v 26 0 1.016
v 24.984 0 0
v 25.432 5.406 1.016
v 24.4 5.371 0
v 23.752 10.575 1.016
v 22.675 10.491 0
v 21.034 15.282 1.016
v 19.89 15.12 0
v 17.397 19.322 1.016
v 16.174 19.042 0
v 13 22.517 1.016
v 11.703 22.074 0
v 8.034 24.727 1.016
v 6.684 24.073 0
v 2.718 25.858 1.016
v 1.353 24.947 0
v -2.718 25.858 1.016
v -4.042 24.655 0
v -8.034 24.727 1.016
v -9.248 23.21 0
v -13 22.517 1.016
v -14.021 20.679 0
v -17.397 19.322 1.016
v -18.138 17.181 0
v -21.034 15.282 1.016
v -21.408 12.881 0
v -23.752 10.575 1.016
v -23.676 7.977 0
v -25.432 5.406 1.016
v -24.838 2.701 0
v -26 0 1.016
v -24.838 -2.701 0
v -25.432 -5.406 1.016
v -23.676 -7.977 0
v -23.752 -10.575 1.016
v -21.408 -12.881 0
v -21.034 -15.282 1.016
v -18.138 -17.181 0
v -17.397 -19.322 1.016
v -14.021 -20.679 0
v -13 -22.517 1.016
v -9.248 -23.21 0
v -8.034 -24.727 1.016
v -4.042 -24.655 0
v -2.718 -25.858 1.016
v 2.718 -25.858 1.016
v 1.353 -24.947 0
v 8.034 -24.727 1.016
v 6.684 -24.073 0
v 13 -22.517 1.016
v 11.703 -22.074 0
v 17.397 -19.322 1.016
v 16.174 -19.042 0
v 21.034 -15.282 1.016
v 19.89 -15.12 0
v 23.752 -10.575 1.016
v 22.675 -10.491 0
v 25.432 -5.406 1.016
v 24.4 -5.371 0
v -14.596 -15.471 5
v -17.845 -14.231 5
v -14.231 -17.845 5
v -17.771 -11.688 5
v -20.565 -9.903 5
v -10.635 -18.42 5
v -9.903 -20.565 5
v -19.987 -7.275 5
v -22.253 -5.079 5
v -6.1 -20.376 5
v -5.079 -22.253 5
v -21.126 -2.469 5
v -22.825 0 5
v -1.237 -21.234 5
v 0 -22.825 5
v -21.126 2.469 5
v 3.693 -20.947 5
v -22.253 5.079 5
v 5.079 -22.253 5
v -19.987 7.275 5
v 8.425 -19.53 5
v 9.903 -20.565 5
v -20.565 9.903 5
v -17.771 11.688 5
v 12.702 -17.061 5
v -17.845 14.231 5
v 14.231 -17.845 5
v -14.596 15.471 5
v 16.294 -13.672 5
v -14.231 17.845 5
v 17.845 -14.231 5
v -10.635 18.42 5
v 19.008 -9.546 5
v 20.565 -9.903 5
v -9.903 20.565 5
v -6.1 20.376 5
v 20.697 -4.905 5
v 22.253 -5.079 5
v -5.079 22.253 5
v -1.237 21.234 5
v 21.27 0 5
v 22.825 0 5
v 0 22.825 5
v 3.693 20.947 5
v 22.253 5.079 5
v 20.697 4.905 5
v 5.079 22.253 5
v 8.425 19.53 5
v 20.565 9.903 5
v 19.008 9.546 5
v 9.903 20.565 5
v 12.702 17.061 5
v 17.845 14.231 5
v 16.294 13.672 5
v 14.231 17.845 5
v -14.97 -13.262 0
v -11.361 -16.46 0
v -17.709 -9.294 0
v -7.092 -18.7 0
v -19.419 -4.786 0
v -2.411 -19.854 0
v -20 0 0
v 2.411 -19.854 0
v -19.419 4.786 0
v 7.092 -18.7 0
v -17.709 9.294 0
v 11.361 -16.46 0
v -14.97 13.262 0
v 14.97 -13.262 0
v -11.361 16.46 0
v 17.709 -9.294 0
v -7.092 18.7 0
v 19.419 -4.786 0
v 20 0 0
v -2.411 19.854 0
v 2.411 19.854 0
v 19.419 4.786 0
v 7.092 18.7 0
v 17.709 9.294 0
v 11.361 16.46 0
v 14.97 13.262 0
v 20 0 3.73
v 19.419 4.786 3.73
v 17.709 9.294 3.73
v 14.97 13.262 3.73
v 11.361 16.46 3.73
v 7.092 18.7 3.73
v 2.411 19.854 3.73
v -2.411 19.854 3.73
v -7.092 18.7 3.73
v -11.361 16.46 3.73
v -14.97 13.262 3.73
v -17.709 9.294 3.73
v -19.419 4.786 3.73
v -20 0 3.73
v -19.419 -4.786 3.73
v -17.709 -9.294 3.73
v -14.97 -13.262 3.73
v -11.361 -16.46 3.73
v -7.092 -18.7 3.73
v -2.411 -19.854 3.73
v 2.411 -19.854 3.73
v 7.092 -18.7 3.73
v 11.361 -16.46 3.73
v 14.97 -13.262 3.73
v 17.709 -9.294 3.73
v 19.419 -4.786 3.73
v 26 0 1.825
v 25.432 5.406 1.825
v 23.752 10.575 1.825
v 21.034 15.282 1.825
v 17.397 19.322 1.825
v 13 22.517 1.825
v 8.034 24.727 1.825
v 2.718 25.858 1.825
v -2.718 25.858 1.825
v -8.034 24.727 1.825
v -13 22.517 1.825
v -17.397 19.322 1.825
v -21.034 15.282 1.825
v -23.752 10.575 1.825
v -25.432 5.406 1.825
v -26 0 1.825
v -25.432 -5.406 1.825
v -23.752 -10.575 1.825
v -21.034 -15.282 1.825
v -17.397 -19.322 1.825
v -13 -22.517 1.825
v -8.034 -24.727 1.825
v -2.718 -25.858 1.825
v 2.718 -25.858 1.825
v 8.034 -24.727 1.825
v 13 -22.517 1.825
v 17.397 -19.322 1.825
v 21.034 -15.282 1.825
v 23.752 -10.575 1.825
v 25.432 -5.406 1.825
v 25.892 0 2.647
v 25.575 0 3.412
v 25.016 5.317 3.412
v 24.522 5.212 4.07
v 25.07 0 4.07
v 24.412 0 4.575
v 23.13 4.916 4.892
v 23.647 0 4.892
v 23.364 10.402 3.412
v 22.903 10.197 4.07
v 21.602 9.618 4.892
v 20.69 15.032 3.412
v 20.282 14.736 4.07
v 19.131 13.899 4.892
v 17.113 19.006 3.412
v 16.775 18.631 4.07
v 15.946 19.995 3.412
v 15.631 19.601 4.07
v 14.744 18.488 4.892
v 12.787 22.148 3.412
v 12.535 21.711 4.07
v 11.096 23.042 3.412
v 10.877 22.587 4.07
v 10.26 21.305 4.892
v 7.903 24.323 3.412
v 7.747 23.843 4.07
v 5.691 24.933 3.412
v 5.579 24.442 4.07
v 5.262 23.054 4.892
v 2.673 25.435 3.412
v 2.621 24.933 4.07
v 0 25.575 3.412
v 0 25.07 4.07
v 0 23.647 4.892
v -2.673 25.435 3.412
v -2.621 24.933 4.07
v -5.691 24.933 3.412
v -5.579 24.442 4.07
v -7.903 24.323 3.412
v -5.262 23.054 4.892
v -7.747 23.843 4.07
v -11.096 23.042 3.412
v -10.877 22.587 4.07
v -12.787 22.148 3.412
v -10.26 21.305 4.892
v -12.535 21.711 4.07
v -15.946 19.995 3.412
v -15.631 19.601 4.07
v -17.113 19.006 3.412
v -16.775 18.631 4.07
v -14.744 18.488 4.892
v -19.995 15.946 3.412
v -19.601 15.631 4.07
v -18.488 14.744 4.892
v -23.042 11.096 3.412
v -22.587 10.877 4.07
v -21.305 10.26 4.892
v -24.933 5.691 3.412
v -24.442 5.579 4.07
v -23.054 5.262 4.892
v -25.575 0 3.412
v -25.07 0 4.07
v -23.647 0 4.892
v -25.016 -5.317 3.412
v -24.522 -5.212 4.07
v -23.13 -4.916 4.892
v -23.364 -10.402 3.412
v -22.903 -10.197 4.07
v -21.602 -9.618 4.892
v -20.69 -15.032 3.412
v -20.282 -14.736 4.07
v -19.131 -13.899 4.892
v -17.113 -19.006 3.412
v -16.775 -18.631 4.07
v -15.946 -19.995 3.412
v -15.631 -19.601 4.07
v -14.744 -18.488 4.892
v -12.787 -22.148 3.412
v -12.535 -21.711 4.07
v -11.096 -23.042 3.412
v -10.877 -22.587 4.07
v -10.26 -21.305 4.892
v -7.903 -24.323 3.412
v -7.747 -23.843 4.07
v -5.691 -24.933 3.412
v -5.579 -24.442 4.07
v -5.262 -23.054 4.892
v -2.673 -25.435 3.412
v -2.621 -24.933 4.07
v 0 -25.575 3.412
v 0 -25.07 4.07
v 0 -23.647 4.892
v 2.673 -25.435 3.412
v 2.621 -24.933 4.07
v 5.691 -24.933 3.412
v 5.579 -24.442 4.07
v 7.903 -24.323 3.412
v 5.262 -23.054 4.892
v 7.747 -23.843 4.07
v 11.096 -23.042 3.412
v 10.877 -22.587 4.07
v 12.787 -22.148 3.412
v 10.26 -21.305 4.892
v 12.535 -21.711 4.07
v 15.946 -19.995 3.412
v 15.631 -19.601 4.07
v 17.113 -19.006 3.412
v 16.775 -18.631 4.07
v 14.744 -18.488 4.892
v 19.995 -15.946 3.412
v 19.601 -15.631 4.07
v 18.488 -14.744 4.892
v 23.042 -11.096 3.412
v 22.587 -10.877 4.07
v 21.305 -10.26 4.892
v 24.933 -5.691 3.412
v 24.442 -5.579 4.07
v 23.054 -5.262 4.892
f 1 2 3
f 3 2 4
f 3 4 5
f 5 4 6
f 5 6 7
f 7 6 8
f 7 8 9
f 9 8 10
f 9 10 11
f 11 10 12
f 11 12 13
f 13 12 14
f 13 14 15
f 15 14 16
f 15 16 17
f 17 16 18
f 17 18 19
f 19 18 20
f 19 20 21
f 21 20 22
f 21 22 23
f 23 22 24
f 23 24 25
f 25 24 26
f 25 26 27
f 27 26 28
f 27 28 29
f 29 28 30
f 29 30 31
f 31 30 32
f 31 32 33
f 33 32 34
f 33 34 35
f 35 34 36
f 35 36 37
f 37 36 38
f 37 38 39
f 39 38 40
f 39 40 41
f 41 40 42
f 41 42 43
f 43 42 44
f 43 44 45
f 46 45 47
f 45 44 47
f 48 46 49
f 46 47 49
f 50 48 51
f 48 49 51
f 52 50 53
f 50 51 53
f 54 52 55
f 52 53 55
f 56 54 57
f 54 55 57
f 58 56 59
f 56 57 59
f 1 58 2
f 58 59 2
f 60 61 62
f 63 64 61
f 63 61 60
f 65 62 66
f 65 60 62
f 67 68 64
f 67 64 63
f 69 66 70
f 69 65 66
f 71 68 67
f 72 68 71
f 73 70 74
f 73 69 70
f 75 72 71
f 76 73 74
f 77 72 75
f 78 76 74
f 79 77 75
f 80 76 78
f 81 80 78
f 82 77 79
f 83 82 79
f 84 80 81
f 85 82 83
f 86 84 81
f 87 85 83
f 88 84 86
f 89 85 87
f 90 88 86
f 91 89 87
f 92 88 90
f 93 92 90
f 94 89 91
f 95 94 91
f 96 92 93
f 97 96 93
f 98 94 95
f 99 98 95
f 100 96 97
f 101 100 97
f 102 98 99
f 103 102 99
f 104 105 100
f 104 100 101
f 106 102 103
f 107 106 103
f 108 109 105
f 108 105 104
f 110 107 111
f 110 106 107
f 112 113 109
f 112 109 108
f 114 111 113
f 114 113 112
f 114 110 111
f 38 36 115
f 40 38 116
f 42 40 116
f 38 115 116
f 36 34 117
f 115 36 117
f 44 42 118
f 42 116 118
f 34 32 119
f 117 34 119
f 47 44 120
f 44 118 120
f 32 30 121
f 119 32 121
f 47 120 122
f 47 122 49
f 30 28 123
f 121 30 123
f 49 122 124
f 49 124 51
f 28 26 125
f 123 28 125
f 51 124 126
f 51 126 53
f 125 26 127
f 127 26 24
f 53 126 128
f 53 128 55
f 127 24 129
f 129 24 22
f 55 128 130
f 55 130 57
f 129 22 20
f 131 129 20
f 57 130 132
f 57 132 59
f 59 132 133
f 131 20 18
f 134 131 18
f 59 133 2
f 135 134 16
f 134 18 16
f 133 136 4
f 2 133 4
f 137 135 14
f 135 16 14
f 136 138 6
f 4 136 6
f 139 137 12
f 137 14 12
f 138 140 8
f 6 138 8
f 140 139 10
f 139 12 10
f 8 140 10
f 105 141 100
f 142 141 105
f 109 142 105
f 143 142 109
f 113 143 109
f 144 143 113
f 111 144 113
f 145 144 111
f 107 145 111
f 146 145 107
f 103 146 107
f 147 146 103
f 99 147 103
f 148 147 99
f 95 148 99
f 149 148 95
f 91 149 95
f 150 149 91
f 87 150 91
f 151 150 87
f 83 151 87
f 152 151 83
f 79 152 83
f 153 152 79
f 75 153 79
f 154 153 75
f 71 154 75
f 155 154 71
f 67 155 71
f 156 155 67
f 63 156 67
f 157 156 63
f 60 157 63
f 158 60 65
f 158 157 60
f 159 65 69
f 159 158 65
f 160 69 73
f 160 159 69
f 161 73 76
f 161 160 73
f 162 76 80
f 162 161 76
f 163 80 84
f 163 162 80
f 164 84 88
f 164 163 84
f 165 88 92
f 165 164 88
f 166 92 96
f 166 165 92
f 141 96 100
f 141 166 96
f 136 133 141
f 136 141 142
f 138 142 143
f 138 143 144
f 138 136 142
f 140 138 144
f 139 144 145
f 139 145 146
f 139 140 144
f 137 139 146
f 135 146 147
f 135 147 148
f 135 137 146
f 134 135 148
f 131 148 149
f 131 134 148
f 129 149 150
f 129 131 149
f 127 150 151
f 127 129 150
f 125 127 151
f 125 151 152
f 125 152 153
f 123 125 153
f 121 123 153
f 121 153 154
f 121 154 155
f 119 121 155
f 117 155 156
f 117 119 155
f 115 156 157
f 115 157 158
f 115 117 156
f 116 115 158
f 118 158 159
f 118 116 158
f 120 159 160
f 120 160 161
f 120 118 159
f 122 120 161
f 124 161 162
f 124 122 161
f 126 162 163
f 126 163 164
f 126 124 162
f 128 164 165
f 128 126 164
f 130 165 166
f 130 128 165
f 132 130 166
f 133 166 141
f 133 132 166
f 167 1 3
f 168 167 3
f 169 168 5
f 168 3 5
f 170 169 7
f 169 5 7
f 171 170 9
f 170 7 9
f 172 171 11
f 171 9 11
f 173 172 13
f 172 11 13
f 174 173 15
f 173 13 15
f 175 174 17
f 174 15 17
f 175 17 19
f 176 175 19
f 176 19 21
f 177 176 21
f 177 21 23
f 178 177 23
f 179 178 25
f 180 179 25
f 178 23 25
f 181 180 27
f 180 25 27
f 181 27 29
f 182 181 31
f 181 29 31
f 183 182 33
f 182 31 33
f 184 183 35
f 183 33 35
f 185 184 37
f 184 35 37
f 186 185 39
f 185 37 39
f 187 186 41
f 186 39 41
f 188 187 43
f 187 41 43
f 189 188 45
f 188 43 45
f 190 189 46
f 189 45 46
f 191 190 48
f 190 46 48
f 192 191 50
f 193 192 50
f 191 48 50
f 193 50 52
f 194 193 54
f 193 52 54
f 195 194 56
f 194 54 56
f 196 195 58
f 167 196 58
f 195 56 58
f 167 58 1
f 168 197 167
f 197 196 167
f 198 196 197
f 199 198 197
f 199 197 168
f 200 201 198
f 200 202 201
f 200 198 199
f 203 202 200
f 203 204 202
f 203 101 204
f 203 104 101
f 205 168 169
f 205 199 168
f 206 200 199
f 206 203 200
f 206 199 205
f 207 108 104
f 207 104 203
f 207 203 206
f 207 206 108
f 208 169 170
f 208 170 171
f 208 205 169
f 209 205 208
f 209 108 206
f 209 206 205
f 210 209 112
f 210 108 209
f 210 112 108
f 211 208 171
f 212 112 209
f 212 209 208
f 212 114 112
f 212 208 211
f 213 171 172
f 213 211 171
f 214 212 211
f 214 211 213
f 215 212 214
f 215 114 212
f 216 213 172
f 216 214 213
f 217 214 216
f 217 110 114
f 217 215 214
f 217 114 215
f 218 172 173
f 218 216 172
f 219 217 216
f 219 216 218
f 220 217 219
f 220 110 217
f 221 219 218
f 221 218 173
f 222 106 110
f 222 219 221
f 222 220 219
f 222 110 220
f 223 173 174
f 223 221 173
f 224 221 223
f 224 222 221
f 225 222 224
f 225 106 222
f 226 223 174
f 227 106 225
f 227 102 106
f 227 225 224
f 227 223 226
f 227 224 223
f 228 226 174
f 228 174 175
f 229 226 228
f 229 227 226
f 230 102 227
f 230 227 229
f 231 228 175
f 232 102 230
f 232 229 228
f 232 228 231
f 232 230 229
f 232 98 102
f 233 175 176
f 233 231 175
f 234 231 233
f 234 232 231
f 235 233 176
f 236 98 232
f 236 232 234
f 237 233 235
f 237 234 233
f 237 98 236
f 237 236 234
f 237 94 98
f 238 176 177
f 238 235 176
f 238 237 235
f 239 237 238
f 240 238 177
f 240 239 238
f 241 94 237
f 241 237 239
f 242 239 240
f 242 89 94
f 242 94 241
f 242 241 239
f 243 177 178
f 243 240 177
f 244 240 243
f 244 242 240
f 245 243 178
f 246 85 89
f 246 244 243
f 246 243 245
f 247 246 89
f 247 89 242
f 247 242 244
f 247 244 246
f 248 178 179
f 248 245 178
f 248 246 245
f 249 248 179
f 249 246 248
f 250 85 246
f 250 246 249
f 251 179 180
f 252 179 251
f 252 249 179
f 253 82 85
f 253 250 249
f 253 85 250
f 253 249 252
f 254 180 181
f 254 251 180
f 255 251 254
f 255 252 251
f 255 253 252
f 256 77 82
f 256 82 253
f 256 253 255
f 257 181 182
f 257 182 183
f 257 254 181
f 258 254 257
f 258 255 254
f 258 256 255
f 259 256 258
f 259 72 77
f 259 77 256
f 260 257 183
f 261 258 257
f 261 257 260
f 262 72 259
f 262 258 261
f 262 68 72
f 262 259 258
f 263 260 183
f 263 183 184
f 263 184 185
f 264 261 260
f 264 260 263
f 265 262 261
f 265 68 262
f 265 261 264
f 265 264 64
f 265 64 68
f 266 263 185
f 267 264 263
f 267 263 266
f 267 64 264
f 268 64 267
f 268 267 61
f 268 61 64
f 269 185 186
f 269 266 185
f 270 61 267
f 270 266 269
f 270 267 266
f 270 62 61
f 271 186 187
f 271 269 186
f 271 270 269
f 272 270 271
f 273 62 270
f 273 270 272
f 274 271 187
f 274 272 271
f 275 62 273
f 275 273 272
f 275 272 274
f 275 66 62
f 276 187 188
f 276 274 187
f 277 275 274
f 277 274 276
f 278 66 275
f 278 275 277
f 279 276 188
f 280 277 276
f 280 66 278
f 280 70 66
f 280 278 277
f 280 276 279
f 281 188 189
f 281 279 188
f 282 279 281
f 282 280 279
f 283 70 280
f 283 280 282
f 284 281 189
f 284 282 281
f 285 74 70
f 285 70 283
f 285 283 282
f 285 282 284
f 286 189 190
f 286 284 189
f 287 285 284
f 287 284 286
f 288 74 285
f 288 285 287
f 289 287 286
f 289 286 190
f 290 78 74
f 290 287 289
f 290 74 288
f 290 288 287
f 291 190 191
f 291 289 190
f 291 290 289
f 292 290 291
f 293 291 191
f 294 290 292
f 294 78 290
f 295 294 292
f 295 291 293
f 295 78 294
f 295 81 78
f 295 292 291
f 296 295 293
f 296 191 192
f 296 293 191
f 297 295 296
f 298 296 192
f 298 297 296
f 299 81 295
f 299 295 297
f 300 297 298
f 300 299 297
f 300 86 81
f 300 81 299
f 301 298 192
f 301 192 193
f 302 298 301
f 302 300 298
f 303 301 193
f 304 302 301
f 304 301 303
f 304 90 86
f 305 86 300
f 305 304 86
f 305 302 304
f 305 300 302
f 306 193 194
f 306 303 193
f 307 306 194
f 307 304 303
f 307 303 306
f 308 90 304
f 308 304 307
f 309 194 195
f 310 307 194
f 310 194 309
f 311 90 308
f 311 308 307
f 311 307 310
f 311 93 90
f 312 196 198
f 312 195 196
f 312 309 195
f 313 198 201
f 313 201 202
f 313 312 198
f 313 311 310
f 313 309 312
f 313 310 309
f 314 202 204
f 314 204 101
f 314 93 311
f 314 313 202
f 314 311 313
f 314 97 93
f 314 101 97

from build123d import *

# Parameters (mm, degrees)
F0_R     = 23
F0_R_2   = 20
F1_DEPTH = 5
F0_R_3   = 26
F2_DEPTH = 5
F3_R     = 3.175
F4_SIZE  = 1.27
F5_SIZE  = 1.016


with BuildPart() as f1:
    # F0 (on Top) → F1 (new body)
    with BuildSketch(Plane.XY):
        Circle(F0_R)
        Circle(F0_R_2, mode=Mode.SUBTRACT)
    extrude(amount=F1_DEPTH)

    # F0 (on Top) → F2 (join)
    with BuildSketch(Plane.XY):
        Circle(F0_R_3)
        Circle(F0_R, mode=Mode.SUBTRACT)
    extrude(amount=F2_DEPTH)

    # F3
    f3_edges = [f1.edges().sort_by_distance(p)[0] for p in [
        (-26, 0, 5),
    ]]
    fillet(f3_edges, radius=F3_R)

    # F4
    f4_edges = [f1.edges().sort_by_distance(p)[0] for p in [
        (-20, 0, 5),
    ]]
    chamfer(f4_edges, length=F4_SIZE)

    # F5
    f5_edges = [f1.edges().sort_by_distance(p)[0] for p in [
        (-26, 0, 0),
    ]]
    chamfer(f5_edges, length=F5_SIZE)


solid = f1.part
